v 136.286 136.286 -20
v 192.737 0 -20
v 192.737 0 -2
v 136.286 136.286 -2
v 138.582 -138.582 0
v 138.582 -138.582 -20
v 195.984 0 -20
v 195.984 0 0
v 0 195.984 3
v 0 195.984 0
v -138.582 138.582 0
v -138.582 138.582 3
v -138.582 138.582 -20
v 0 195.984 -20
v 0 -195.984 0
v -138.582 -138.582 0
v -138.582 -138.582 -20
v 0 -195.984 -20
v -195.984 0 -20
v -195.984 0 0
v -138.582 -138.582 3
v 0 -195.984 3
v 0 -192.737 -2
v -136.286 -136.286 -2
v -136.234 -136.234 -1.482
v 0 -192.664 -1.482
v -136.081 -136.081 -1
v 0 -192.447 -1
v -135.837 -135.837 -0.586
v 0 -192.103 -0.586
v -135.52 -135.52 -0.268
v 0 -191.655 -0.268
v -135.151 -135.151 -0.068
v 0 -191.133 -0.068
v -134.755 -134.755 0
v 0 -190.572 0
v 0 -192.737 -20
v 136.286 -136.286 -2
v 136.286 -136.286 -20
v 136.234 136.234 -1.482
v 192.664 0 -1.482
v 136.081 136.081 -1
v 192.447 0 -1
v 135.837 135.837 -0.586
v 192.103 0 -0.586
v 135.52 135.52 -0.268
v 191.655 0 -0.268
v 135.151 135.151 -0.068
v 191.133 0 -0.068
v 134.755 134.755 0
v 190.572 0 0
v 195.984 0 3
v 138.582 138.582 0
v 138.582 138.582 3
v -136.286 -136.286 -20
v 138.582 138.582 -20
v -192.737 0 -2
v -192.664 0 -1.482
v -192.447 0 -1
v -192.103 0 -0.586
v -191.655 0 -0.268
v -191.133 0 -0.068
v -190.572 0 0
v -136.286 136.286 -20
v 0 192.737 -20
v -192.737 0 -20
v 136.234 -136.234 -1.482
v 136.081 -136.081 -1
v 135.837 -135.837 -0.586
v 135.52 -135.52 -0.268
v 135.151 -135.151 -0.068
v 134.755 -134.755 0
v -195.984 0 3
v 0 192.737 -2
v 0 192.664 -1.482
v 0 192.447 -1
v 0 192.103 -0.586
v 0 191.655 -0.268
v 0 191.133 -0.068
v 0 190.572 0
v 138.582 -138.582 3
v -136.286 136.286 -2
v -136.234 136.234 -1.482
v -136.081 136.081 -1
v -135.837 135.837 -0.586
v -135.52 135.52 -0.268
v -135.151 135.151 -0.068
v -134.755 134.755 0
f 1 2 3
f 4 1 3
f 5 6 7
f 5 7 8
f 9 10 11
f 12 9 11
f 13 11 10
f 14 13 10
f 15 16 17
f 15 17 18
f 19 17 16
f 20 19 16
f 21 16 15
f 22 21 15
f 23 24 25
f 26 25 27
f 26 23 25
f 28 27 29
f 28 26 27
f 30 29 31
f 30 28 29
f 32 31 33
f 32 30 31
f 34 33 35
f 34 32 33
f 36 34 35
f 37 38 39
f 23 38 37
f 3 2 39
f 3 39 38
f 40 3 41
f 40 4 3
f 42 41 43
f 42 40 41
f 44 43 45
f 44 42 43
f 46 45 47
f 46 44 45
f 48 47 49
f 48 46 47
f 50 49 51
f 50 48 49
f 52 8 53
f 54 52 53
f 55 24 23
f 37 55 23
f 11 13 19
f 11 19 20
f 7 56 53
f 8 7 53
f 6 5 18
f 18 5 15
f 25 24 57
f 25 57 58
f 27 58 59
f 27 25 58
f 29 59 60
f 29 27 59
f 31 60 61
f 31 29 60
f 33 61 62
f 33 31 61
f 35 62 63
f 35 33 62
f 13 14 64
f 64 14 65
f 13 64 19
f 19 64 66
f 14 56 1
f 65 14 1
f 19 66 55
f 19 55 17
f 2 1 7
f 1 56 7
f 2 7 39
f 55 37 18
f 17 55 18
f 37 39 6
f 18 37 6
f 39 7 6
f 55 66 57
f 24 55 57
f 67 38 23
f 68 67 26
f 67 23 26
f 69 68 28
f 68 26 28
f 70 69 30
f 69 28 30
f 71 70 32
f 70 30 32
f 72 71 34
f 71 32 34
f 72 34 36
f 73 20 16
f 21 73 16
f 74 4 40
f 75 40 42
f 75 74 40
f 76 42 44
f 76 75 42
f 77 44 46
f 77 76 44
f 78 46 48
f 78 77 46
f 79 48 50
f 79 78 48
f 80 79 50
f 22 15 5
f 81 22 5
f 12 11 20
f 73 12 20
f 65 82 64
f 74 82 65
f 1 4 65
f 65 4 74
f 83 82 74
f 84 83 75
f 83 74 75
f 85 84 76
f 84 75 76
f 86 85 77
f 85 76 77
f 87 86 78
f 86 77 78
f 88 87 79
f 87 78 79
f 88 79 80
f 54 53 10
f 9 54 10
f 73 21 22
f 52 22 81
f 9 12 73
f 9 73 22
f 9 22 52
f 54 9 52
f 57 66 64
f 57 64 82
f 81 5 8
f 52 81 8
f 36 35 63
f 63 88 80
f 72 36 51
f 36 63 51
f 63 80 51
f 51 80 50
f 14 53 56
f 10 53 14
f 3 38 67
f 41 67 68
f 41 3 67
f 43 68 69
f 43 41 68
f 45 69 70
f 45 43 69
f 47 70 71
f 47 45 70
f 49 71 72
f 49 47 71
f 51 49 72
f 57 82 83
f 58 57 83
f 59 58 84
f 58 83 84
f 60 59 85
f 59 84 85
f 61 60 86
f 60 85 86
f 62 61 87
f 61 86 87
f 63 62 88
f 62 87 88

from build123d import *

# Parameters (mm, degrees)
BOSS_EXTRUDE1_DEPTH     = 3
SKETCH5_W               = 150
SKETCH5_H               = 20
BOSS_EXTRUDE2_DEPTH     = 3
MIRROR2_COPY_1_SKETCH_W = 150
MIRROR2_COPY_1_SKETCH_H = 20
MIRROR2_COPY_1_DEPTH    = 3
SKETCH6_W               = 23
SKETCH6_H               = 150
BOSS_EXTRUDE3_DEPTH     = 3
MIRROR4_COPY_1_SKETCH_W = 23
MIRROR4_COPY_1_SKETCH_H = 150
MIRROR4_COPY_1_DEPTH    = 3
MIRROR4_COPY_2_SKETCH_W = 23
MIRROR4_COPY_2_SKETCH_H = 150
MIRROR4_COPY_2_DEPTH    = 3
FILLET1_R               = 2


with BuildPart() as part:
    # Sketch1 → Boss-Extrude1 (new body)
    with BuildSketch(Plane.XY):
        Polygon((0, 195.984444731), (-138.581929877, 138.581929877), (-195.984444731, 0), (-138.581929877, -138.581929877), (0, -195.984444731), (138.581929877, -138.581929877), (195.984444731, 0), (138.581929877, 138.581929877), align=None)
    boss_extrude1 = extrude(amount=BOSS_EXTRUDE1_DEPTH)

    # Sketch5 → Boss-Extrude2 (add)
    with BuildSketch(Plane(origin=(-69.290964938, -167.283187304, 0), x_dir=(0.923879533, -0.382683432, 0), z_dir=(-0.382683432, -0.923879533, 0))):
        with Locations((0, -10)):
            Rectangle(SKETCH5_W, SKETCH5_H)
    boss_extrude2 = extrude(amount=-BOSS_EXTRUDE2_DEPTH)

    # Mirror1: Boss-Extrude2 across plane
    add(boss_extrude2.mirror(Plane.ZX))

    # Mirror2: Boss-Extrude2 across plane
    add(boss_extrude2.mirror(Plane(origin=(0, 0, 0), x_dir=(0, 0, 1), z_dir=(1, 0, 0))))

    # Mirror2 copy 1 sketch → Mirror2 copy 1 (add)
    with BuildSketch(Plane(origin=(69.290964938, 167.283187304, 0), x_dir=(-0.923879533, 0.382683432, 0), z_dir=(0.382683432, 0.923879533, 0))):
        with Locations((0, -10)):
            Rectangle(MIRROR2_COPY_1_SKETCH_W, MIRROR2_COPY_1_SKETCH_H)
    extrude(amount=-MIRROR2_COPY_1_DEPTH)

    # Sketch6 → Boss-Extrude3 (add)
    with BuildSketch(Plane(origin=(-167.283187304, -69.290964938, 0), x_dir=(0, 0, 1), z_dir=(-0.923879533, -0.382683432, 0))):
        with Locations((-8.5, 0)):
            Rectangle(SKETCH6_W, SKETCH6_H)
    boss_extrude3 = extrude(amount=-BOSS_EXTRUDE3_DEPTH)

    # Mirror3: Boss-Extrude3 across plane
    add(boss_extrude3.mirror(Plane.ZX))

    # Mirror4: Boss-Extrude1 across plane
    add(boss_extrude1.mirror(Plane(origin=(0, 0, 0), x_dir=(0, 0, 1), z_dir=(1, 0, 0))))

    # Mirror4 copy 1 sketch → Mirror4 copy 1 (add)
    with BuildSketch(Plane(origin=(167.283187304, 69.290964938, 0), x_dir=(0, 0, 1), z_dir=(0.923879533, 0.382683432, 0))):
        with Locations((-8.5, 0)):
            Rectangle(MIRROR4_COPY_1_SKETCH_W, MIRROR4_COPY_1_SKETCH_H)
    extrude(amount=-MIRROR4_COPY_1_DEPTH)

    # Mirror4 copy 2 sketch → Mirror4 copy 2 (add)
    with BuildSketch(Plane(origin=(167.283187304, -69.290964938, 0), x_dir=(0, 0, 1), z_dir=(0.923879533, -0.382683432, 0))):
        with Locations((-8.5, 0)):
            Rectangle(MIRROR4_COPY_2_SKETCH_W, MIRROR4_COPY_2_SKETCH_H)
    extrude(amount=-MIRROR4_COPY_2_DEPTH)

    # Fillet1
    fillet1_edges = [part.edges().sort_by_distance(p)[0] for p in [
        (-164.511548707, -68.142914641, 0),
        (-164.511548707, 68.142914641, 0),
        (164.511548707, 68.142914641, 0),
        (164.511548707, -68.142914641, 0),
        (-68.142914641, 164.511548707, 0),
        (68.142914641, 164.511548707, 0),
        (-68.142914641, -164.511548707, 0),
        (68.142914641, -164.511548707, 0),
    ]]
    fillet(fillet1_edges, radius=FILLET1_R)


solid = part.part
